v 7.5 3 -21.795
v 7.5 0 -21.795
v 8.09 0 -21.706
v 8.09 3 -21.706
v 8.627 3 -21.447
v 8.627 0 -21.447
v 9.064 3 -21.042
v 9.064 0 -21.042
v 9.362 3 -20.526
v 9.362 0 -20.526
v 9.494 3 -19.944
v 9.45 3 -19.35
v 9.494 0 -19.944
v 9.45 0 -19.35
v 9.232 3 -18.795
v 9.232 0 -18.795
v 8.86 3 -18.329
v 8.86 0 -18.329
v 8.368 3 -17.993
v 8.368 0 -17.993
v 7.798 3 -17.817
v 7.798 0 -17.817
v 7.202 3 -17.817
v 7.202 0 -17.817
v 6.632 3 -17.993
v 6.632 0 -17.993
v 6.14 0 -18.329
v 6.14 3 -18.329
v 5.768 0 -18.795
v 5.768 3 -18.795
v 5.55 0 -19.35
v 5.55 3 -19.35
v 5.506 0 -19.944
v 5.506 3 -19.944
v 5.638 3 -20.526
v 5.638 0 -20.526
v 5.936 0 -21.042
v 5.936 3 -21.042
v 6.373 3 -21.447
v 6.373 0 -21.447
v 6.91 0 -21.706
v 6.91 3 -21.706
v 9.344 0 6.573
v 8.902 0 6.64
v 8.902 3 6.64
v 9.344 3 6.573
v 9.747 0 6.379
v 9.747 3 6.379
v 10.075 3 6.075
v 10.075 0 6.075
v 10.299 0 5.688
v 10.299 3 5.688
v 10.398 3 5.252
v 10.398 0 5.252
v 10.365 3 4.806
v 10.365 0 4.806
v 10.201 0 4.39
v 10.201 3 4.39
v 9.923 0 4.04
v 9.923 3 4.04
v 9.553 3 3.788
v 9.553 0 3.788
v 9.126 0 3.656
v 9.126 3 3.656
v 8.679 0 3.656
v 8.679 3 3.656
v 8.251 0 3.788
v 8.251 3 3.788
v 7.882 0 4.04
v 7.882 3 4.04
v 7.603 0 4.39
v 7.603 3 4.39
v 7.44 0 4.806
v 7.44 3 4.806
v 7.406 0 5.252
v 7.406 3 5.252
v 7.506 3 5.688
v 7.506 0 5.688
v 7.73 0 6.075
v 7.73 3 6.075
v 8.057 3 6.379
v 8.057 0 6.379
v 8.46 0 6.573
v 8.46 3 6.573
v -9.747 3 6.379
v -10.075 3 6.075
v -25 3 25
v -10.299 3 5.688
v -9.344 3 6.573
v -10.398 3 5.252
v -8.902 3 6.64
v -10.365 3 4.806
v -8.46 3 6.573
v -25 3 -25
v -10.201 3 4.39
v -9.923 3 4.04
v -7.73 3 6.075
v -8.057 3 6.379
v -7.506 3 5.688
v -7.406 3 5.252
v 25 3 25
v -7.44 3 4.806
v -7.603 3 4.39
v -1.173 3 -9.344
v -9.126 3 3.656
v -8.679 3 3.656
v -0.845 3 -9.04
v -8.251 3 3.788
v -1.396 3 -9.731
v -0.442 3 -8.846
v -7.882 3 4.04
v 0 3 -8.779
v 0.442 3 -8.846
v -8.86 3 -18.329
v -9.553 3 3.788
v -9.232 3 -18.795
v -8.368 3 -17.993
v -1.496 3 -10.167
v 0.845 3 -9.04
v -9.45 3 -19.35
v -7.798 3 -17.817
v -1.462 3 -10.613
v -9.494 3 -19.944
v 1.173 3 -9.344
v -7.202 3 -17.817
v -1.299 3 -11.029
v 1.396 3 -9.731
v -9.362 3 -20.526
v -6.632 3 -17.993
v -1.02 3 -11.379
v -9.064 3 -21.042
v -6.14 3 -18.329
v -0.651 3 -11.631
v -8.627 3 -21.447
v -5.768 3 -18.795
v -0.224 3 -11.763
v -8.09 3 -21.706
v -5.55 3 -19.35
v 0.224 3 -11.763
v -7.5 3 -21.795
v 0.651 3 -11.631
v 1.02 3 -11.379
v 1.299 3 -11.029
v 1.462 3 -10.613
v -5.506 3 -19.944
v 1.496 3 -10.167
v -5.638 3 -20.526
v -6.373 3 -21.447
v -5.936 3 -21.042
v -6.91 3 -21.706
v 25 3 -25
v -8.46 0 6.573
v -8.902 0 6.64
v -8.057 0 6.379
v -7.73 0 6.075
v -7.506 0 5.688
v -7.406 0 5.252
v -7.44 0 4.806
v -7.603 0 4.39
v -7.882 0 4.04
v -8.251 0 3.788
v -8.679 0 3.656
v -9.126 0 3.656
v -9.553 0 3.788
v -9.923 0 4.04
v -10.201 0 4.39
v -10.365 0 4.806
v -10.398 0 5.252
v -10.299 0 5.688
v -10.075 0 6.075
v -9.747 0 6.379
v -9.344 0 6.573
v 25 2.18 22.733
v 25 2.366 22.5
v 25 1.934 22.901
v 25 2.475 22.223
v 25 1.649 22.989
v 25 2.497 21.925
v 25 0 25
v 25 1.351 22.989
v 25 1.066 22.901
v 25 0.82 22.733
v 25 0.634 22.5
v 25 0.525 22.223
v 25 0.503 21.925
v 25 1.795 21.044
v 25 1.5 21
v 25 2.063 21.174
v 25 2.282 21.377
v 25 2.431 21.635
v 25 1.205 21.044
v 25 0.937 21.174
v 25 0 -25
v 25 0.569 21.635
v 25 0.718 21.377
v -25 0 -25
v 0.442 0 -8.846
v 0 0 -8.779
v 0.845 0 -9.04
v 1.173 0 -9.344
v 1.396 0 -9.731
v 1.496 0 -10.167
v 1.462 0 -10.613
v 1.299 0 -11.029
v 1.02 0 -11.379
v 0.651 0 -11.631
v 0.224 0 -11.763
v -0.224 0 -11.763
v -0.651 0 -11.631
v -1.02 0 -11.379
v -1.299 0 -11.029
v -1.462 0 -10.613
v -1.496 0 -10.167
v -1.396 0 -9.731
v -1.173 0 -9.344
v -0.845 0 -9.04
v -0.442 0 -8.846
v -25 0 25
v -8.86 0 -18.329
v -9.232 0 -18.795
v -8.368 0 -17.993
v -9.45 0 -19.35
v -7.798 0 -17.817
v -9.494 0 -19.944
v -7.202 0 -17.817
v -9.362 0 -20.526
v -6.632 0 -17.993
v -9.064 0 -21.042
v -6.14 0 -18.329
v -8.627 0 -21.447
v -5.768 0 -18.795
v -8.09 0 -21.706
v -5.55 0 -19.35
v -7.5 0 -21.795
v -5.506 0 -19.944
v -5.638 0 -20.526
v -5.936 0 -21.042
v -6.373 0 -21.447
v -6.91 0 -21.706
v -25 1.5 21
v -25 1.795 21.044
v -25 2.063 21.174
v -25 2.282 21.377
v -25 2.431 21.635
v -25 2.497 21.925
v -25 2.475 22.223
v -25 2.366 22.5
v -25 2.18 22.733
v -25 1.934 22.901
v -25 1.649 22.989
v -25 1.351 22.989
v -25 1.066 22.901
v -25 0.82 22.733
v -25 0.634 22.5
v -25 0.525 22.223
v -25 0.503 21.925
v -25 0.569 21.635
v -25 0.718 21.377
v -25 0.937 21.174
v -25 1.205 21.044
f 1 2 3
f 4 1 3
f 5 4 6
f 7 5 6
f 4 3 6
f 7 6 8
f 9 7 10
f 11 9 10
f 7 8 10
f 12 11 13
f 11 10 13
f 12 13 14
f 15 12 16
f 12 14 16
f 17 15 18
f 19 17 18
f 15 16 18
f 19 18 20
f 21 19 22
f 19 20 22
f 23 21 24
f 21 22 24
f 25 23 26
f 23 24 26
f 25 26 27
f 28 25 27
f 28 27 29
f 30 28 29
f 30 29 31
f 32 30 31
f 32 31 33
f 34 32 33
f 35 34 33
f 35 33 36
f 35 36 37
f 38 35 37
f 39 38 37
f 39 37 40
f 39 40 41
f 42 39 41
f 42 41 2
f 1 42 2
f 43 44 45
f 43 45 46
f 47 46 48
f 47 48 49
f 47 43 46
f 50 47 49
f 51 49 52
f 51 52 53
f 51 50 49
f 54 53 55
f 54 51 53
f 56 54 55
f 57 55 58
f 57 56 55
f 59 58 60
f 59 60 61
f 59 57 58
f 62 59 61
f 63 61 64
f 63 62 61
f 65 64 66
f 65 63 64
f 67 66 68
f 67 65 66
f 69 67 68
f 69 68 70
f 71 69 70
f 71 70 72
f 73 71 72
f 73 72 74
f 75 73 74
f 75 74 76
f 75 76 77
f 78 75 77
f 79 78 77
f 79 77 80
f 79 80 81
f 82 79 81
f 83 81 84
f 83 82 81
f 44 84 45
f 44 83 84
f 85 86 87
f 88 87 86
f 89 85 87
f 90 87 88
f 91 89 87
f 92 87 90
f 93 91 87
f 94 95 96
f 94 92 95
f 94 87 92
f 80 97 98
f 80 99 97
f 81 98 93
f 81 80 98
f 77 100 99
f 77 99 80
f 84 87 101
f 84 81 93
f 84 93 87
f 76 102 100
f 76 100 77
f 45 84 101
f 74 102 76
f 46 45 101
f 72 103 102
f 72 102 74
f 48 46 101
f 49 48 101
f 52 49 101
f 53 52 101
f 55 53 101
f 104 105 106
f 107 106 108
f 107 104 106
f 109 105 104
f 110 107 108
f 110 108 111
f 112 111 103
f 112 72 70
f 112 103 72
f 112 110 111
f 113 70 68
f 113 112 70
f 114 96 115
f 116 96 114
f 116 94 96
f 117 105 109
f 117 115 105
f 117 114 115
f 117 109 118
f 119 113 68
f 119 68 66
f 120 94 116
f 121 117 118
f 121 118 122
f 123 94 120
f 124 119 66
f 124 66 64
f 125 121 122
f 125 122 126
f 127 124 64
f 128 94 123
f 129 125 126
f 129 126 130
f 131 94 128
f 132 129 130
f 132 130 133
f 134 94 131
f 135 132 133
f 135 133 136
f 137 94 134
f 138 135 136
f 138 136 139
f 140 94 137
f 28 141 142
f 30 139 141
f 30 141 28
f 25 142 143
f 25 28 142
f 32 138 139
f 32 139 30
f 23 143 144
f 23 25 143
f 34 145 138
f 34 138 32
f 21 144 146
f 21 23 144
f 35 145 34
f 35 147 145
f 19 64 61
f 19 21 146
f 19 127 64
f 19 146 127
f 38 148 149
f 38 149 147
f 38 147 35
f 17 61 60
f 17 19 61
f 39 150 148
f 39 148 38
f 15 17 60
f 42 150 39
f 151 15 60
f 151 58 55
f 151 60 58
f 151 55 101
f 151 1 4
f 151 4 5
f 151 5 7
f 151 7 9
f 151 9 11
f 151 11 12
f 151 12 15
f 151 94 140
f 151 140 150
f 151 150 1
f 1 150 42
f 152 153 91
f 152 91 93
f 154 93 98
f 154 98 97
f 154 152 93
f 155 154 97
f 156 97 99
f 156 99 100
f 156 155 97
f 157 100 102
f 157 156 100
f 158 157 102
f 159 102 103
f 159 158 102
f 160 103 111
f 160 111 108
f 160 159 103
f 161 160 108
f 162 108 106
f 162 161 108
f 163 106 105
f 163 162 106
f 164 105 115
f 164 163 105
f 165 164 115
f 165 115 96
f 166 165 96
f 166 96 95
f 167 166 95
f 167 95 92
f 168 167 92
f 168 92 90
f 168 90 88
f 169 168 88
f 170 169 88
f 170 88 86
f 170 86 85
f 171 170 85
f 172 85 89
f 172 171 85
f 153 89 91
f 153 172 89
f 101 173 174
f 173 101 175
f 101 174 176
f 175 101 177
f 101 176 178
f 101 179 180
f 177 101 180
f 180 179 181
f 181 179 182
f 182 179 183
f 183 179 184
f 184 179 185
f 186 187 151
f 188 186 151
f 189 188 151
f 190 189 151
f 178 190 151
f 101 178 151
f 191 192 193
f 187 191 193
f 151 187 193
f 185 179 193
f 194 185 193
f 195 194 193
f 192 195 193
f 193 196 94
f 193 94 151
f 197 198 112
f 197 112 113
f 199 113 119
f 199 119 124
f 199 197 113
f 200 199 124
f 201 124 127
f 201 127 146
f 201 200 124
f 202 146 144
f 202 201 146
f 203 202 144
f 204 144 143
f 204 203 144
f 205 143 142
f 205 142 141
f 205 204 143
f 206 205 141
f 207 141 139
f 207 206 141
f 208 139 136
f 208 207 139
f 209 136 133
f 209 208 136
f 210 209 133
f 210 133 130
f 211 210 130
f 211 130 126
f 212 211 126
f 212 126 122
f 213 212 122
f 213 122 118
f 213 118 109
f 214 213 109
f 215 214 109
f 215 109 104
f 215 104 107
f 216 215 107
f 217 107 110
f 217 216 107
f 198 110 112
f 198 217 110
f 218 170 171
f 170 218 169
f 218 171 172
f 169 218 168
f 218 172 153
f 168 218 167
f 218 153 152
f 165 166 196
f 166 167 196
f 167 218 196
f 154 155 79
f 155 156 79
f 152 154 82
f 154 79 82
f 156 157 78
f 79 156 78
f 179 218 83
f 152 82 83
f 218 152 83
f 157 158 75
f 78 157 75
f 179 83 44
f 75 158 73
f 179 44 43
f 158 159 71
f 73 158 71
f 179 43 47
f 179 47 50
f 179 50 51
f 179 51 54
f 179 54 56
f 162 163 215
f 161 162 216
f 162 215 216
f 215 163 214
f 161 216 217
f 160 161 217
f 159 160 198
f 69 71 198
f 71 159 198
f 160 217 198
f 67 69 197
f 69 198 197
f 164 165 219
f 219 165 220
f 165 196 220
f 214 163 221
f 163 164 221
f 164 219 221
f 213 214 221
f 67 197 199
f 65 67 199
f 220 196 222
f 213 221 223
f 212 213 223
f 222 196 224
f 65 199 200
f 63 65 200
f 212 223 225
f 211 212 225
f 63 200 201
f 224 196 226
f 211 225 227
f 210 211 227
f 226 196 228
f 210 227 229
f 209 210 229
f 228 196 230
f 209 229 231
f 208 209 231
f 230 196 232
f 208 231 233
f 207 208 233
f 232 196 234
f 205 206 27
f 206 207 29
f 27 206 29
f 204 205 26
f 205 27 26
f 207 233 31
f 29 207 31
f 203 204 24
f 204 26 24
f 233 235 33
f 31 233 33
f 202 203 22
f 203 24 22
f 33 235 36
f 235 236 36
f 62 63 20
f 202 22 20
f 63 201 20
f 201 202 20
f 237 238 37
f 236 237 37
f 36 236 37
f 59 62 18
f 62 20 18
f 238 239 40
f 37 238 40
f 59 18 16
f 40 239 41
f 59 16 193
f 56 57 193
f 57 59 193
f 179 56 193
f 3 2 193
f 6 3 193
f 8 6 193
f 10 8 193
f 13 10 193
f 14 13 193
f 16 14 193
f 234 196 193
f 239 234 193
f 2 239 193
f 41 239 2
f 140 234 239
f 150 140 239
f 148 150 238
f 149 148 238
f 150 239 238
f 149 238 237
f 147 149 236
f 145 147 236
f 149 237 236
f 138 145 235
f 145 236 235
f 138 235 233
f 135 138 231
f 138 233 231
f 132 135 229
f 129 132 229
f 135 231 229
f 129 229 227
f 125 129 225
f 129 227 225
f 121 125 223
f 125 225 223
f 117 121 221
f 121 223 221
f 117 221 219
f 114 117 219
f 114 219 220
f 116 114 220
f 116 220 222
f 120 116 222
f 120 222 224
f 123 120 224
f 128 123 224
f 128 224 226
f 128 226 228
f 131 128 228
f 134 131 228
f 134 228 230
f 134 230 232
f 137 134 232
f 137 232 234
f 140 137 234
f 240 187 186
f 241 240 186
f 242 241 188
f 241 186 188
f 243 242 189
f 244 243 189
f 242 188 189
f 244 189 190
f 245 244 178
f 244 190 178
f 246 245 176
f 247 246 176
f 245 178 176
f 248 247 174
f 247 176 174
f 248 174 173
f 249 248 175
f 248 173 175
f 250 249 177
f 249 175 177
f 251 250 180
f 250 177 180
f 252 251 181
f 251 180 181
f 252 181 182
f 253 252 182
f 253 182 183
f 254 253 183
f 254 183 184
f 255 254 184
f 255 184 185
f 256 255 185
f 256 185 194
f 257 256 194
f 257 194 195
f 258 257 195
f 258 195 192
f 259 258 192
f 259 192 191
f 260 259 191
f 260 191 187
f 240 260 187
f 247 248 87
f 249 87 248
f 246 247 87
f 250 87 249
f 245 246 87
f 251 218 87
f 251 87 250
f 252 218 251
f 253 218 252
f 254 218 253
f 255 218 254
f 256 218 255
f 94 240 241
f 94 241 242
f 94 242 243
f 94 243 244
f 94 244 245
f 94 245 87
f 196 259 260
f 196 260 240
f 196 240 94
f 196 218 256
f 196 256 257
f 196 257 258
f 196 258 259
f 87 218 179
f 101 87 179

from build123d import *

# Parameters (mm, degrees)
SKETCH_1_W          = 50
SKETCH_1_H          = 50
SKETCH_1_R          = 1.5
EXTRUDE_1_DEPTH     = 3
SKETCH_2_R          = 1
CUT_EXTRUDE_2_DEPTH = 56.982140009
SKETCH_4_R          = 2
CUT_EXTRUDE_4_DEPTH = 50


with BuildPart() as part:
    # 草图1 → 凸台-拉伸1 (new body)
    with BuildSketch(Plane(origin=(0, 0, 0), x_dir=(1, 0, 0), z_dir=(0, 1, 0))):
        Rectangle(SKETCH_1_W, SKETCH_1_H)
        with Locations(Location((0, 10.279455753, 0), (0, 0, 270))):
            Circle(SKETCH_1_R, mode=Mode.SUBTRACT)
        with Locations(Location((8.902269819, -5.139727877, 0), (0, 0, 270))):
            Circle(SKETCH_1_R, mode=Mode.SUBTRACT)
        with Locations(Location((-8.902269819, -5.139727877, 0), (0, 0, 270))):
            Circle(SKETCH_1_R, mode=Mode.SUBTRACT)
    extrude(amount=EXTRUDE_1_DEPTH)

    # 草图2 → 切除-拉伸2 (cut, through all)
    with BuildSketch(Plane(origin=(25, 0, 0), x_dir=(0, 0, -1), z_dir=(1, 0, 0))):
        with Locations((-22, 1.5)):
            Circle(SKETCH_2_R)
    extrude(amount=-CUT_EXTRUDE_2_DEPTH, mode=Mode.SUBTRACT)

    # 草图4 → 切除-拉伸4 (cut)
    with BuildSketch(Plane.XZ):
        with Locations(Location((-7.5, -19.794917773, 0), (0, 0, 270))):
            Circle(SKETCH_4_R)
        with Locations(Location((7.5, -19.794917773, 0), (0, 0, 270))):
            Circle(SKETCH_4_R)
    extrude(amount=-CUT_EXTRUDE_4_DEPTH, mode=Mode.SUBTRACT)


solid = part.part
